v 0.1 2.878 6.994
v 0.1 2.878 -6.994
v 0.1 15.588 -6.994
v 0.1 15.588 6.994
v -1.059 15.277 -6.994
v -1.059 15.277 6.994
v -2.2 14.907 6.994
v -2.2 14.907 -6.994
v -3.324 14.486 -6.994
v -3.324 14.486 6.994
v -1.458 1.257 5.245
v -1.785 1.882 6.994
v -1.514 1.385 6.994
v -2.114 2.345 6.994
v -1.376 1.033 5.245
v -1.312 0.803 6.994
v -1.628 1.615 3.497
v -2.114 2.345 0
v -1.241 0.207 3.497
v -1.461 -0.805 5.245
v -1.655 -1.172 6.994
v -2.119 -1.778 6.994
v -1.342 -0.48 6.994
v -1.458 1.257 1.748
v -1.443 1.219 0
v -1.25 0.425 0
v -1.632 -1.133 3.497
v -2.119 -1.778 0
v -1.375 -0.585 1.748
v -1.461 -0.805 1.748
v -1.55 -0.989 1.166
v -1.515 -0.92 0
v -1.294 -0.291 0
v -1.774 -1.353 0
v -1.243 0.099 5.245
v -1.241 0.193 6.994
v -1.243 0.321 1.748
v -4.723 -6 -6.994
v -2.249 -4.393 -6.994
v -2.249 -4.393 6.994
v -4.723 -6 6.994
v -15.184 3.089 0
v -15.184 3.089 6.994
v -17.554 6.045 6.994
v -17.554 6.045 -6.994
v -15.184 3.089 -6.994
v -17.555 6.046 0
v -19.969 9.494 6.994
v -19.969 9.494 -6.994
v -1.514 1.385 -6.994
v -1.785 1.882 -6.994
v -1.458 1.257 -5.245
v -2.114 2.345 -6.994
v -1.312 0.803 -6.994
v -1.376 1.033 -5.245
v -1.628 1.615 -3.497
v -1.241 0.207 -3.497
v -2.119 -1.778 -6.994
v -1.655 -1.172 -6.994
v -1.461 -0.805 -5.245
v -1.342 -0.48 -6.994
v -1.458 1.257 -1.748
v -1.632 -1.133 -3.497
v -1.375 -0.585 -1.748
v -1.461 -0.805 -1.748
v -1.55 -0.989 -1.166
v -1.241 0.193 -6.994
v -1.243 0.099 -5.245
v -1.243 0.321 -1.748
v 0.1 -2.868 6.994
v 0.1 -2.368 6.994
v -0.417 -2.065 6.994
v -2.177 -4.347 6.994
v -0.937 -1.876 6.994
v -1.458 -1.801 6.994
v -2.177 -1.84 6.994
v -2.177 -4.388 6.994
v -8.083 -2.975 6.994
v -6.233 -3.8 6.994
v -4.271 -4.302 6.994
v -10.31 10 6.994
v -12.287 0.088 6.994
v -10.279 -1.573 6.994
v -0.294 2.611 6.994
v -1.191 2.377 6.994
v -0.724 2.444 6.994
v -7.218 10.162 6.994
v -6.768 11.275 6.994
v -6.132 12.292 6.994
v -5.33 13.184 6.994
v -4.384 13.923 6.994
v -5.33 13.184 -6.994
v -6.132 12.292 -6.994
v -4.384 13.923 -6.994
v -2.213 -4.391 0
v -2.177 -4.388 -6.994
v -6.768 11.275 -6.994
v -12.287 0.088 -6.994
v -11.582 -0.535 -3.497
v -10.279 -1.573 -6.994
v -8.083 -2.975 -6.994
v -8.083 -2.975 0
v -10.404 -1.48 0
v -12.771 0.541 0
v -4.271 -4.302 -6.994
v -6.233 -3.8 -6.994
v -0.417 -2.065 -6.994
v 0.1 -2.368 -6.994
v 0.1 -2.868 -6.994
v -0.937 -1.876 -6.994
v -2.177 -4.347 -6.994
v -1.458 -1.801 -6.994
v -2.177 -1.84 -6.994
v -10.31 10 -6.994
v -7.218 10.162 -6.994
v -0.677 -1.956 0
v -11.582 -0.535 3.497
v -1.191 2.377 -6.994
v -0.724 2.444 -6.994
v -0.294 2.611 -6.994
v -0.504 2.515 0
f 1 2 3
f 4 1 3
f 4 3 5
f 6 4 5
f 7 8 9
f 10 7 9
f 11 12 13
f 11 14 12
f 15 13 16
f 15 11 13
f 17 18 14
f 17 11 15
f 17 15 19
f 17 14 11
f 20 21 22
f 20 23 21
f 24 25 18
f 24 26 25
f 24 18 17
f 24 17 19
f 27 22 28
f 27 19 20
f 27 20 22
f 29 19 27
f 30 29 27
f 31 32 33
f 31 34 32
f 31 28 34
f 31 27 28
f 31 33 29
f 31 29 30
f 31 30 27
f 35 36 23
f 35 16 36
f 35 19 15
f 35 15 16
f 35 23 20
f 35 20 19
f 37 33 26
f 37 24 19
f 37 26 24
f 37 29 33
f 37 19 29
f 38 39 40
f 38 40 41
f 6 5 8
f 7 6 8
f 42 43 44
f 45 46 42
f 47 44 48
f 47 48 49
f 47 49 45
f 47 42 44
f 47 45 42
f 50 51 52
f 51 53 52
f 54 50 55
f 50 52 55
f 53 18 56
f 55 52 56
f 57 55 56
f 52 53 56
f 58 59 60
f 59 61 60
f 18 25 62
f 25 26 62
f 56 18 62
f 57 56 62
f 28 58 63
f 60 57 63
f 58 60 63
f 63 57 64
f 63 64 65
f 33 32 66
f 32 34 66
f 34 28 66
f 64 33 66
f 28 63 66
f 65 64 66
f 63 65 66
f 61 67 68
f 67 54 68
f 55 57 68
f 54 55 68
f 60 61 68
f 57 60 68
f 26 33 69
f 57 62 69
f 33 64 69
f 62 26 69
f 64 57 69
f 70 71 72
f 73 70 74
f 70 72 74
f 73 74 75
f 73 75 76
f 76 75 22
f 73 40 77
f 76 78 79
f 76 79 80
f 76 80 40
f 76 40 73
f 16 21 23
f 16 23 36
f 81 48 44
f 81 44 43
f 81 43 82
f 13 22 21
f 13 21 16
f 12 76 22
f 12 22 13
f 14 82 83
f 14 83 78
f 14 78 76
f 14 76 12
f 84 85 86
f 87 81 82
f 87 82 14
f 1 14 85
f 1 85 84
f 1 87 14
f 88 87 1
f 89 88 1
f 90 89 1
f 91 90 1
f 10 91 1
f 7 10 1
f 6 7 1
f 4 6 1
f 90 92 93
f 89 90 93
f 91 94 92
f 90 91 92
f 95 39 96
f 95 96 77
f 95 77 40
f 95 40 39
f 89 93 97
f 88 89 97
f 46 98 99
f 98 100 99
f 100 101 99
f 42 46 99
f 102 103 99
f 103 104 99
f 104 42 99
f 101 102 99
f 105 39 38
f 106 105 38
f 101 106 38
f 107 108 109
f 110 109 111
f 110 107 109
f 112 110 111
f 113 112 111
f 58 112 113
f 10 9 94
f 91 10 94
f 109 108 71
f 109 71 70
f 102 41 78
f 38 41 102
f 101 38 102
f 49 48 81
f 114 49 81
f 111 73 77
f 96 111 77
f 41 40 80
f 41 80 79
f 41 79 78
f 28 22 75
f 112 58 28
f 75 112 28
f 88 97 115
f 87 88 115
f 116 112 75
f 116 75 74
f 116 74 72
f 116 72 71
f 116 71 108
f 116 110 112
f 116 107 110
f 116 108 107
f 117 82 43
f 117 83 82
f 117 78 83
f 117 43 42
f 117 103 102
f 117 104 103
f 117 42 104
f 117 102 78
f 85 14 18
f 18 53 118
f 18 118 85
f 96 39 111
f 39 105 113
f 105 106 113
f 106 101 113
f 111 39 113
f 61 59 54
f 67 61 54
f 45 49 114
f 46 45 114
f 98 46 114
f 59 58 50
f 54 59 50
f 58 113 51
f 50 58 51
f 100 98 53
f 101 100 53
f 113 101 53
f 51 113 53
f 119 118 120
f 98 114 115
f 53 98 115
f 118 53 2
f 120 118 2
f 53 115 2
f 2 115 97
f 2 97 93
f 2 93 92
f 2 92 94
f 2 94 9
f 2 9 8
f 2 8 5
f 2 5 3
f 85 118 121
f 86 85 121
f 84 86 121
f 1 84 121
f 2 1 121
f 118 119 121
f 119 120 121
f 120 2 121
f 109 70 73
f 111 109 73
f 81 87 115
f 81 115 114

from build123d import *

# Parameters (mm, degrees)
CROQUIS_BASE_DEPTH              = 6.9937
LENTE_PPAL_1_REACH              = 29.176
LENTE_PPAL_1_DIRECTION_2_REACH  = 29.176
LENTE_PPAL_2_DEPTH              = 28.175928622
LENTE_PPAL_2_DEPTH_BACK         = 28.175928622
CROQUIS9_3_OUTSIDE_W            = 30.065
CROQUIS9_3_OUTSIDE_H            = 25.937
LENTE_FRONTAL_REACH             = 25.403
LENTE_FRONTAL_DIRECTION_2_REACH = 25.403
LENTE_TRASERA_REACH             = 28.281
LENTE_TRASERA_DIRECTION_2_REACH = 28.281


with BuildPart() as part:
    # Croquis1 → croquis base (new, symmetric)
    with BuildSketch(Plane.XY):
        with BuildLine():
            Line((-6.994875026, 10.477389992), (-8.981845695, 12.608155172))
            Line((-8.981845695, 12.608155172), (-23.035921146, 11.871612288))
            Line((-23.035921146, 11.871612288), (-23.035921146, 11.54013782))
            ThreePointArc((-23.035921146, 11.54013782), (-20.949684518, 9.582335705), (-18.945192114, 7.540918896))
            add(Edge.make_bspline(
                [(-18.945192114, 7.540918896), (-10.215008384, -3.697644103), (-2.846604825, -5.059081104)],
                knots=[0.497667241, 0.497667241, 0.497667241, 0.49955428, 0.49955428, 0.49955428], degree=2))
            add(Edge.make_bspline(
                [(-2.846604825, -5.059081104), (-2.498165198, -4.87297933), (-2.177330417, -4.684462446)],
                knots=[0.498812075, 0.498812075, 0.498812075, 0.498911556, 0.498911556, 0.498911556], degree=2))
            Line((-2.177330418, -4.684462446), (-2.177330418, 6.186438919))
            add(Edge.make_bspline(
                [(-2.177330418, 6.186438919), (-4.063319702, 8.141636997), (-6.994875026, 10.477389992)],
                knots=[0.50138293, 0.50138293, 0.50138293, 0.502013312, 0.502013312, 0.502013312], degree=2))
        make_face()
    extrude(amount=CROQUIS_BASE_DEPTH, both=True)

    # lente ppal 1: up to this face of the body (flat: up to its plane)
    lente_ppal_1_end = Plane(part.part.faces().sort_by_distance((-10.153546236, 5.159655324, 6.9937))[0])
    # Croquis9 → lente ppal 1 (add, up to the picked face)
    with BuildSketch(Plane.XY, mode=Mode.PRIVATE) as lente_ppal_1_sk1:
        with BuildLine():
            Line((-2.177330418, -4.388282022), (-2.177330418, -1.840420572))
            add(Edge.make_bspline(
                [(-2.177330418, 2.424232079), (-0.304369248, 0.128042884), (-2.177330418, -1.840420572)],
                knots=[0, 0, 0, 1, 1, 1], degree=2))
            Line((-2.177330418, 2.424232079), (-2.177330418, 6.082860828))
            Line((-2.177330418, 6.082860828), (-10.309820395, 10))
            Line((-10.309820395, 10), (-19.969359014, 9.493765032))
            add(Edge.make_bspline(
                [(-2.177330418, -4.388282022), (-10.4130765, -4.994158739), (-19.969359014, 9.493765032)],
                knots=[0, 0, 0, 1, 1, 1], degree=2))
        make_face()
    lente_ppal_1_tool1 = split(extrude(lente_ppal_1_sk1.sketch, amount=LENTE_PPAL_1_REACH, mode=Mode.PRIVATE), bisect_by=lente_ppal_1_end, keep=Keep.BOTH, mode=Mode.PRIVATE)
    add(lente_ppal_1_tool1.solids().sort_by(Axis((-9.106368, 3.599172, 0), (0, 0, 1)))[0])

    # lente ppal 1 direction 2: up to this face of the body (flat: up to its plane)
    lente_ppal_1_direction_2_end = Plane(part.part.faces().sort_by_distance((-10.153546236, 5.159655324, -6.9937))[0])
    # Croquis9 → lente ppal 1 direction 2 (add, up to the picked face)
    with BuildSketch(Plane.XY, mode=Mode.PRIVATE) as lente_ppal_1_direction_2_sk1:
        with BuildLine():
            Line((-2.177330418, -4.388282022), (-2.177330418, -1.840420572))
            add(Edge.make_bspline(
                [(-2.177330418, 2.424232079), (-0.304369248, 0.128042884), (-2.177330418, -1.840420572)],
                knots=[0, 0, 0, 1, 1, 1], degree=2))
            Line((-2.177330418, 2.424232079), (-2.177330418, 6.082860828))
            Line((-2.177330418, 6.082860828), (-10.309820395, 10))
            Line((-10.309820395, 10), (-19.969359014, 9.493765032))
            add(Edge.make_bspline(
                [(-2.177330418, -4.388282022), (-10.4130765, -4.994158739), (-19.969359014, 9.493765032)],
                knots=[0, 0, 0, 1, 1, 1], degree=2))
        make_face()
    lente_ppal_1_direction_2_tool1 = split(extrude(lente_ppal_1_direction_2_sk1.sketch, amount=-LENTE_PPAL_1_DIRECTION_2_REACH, mode=Mode.PRIVATE), bisect_by=lente_ppal_1_direction_2_end, keep=Keep.BOTH, mode=Mode.PRIVATE)
    add(lente_ppal_1_direction_2_tool1.solids().sort_by(Axis((-9.106368, 3.599172, 0), (0, 0, -1)))[0])

    # Croquis9<3> outside → lente ppal 2 (cut, two sides: drawn at the far end of the back side and taken through both)
    with BuildSketch(Plane.XY.offset(-LENTE_PPAL_2_DEPTH_BACK)):
        with Locations((-12.1385, 3.7745)):
            Rectangle(CROQUIS9_3_OUTSIDE_W, CROQUIS9_3_OUTSIDE_H)
        with BuildLine():
            Line((-2.177330418, -1.840420572), (-2.177330418, -4.388282022))
            add(Edge.make_bspline(
                [(-2.177330418, -4.388282022), (-10.4130765, -4.994158739), (-19.969359014, 9.493765032)],
                knots=[0, 0, 0, 1, 1, 1], degree=2))
            Line((-19.969359014, 9.493765032), (-10.309820395, 10))
            Line((-10.309820395, 10), (-2.177330418, 6.082860828))
            Line((-2.177330418, 6.082860828), (-2.177330418, 2.424232079))
            add(Edge.make_bspline(
                [(-2.177330418, 2.424232079), (-0.304369248, 0.128042884), (-2.177330418, -1.840420572)],
                knots=[0, 0, 0, 1, 1, 1], degree=2))
        make_face(mode=Mode.SUBTRACT)
    extrude(amount=LENTE_PPAL_2_DEPTH + LENTE_PPAL_2_DEPTH_BACK, mode=Mode.SUBTRACT)

    # lente frontal: up to this face of the body (flat: up to its plane)
    lente_frontal_end = Plane(part.part.faces().sort_by_distance((-9.106367081, 3.599171888, 6.9937))[0])
    # Croquis8 → lente frontal (add, up to the picked face)
    with BuildSketch(Plane.XY, mode=Mode.PRIVATE) as lente_frontal_sk1:
        with BuildLine():
            Line((0.1, 2.877673418), (0.1, 15.587903347))
            Line((0.1, 15.587903347), (-1.059110992, 15.277320493))
            Line((-1.059110992, 15.277320493), (-2.200378811, 14.9065001))
            Line((-2.200378811, 14.9065001), (-3.324385438, 14.486251242))
            Line((-3.324385438, 14.486251242), (-4.38392255, 13.922885367))
            Line((-4.38392255, 13.922885367), (-5.329535454, 13.184091597))
            Line((-5.329535454, 13.184091597), (-6.132492182, 12.292317806))
            Line((-6.132492182, 12.292317806), (-6.768395299, 11.274660091))
            Line((-6.768395299, 11.274660091), (-7.217923211, 10.162039465))
            Line((-7.217923211, 10.162039465), (-10.309820395, 10))
            Line((-10.309820395, 10), (-2.177330418, 2.342487007))
            Line((-2.177330418, 2.342487007), (-1.190501641, 2.376947827))
            add(Edge.make_bspline(
                [(-1.190501641, 2.376947827), (-0.463368169, 2.402339888), (0.1, 2.877673418)],
                knots=[0, 0, 0, 1, 1, 1], degree=2))
        make_face()
    lente_frontal_tool1 = split(extrude(lente_frontal_sk1.sketch, amount=LENTE_FRONTAL_REACH, mode=Mode.PRIVATE), bisect_by=lente_frontal_end, keep=Keep.BOTH, mode=Mode.PRIVATE)
    add(lente_frontal_tool1.solids().sort_by(Axis((-3.290182, 8.96302, 0), (0, 0, 1)))[0])

    # lente frontal direction 2: up to this face of the body (flat: up to its plane)
    lente_frontal_direction_2_end = Plane(part.part.faces().sort_by_distance((-9.106367081, 3.599171888, -6.9937))[0])
    # Croquis8 → lente frontal direction 2 (add, up to the picked face)
    with BuildSketch(Plane.XY, mode=Mode.PRIVATE) as lente_frontal_direction_2_sk1:
        with BuildLine():
            Line((0.1, 2.877673418), (0.1, 15.587903347))
            Line((0.1, 15.587903347), (-1.059110992, 15.277320493))
            Line((-1.059110992, 15.277320493), (-2.200378811, 14.9065001))
            Line((-2.200378811, 14.9065001), (-3.324385438, 14.486251242))
            Line((-3.324385438, 14.486251242), (-4.38392255, 13.922885367))
            Line((-4.38392255, 13.922885367), (-5.329535454, 13.184091597))
            Line((-5.329535454, 13.184091597), (-6.132492182, 12.292317806))
            Line((-6.132492182, 12.292317806), (-6.768395299, 11.274660091))
            Line((-6.768395299, 11.274660091), (-7.217923211, 10.162039465))
            Line((-7.217923211, 10.162039465), (-10.309820395, 10))
            Line((-10.309820395, 10), (-2.177330418, 2.342487007))
            Line((-2.177330418, 2.342487007), (-1.190501641, 2.376947827))
            add(Edge.make_bspline(
                [(-1.190501641, 2.376947827), (-0.463368169, 2.402339888), (0.1, 2.877673418)],
                knots=[0, 0, 0, 1, 1, 1], degree=2))
        make_face()
    lente_frontal_direction_2_tool1 = split(extrude(lente_frontal_direction_2_sk1.sketch, amount=-LENTE_FRONTAL_DIRECTION_2_REACH, mode=Mode.PRIVATE), bisect_by=lente_frontal_direction_2_end, keep=Keep.BOTH, mode=Mode.PRIVATE)
    add(lente_frontal_direction_2_tool1.solids().sort_by(Axis((-3.290182, 8.96302, 0), (0, 0, -1)))[0])

    # lente trasera: up to this face of the body (flat: up to its plane)
    lente_trasera_end = Plane(part.part.faces().sort_by_distance((-7.357064552, 5.305385386, 6.9937))[0])
    # Croquis11 → lente trasera (add, up to the picked face)
    with BuildSketch(Plane.XY, mode=Mode.PRIVATE) as lente_trasera_sk1:
        with BuildLine():
            Line((0.1, -2.367807069), (0.1, -2.867807069))
            Line((0.1, -2.867807069), (-4.723154154, -6))
            Line((-4.723154154, -6), (-9.706405629, -1.513060218))
            Line((-9.706405629, -1.513060218), (-1.458120605, -1.801096678))
            add(Edge.make_bspline(
                [(-1.458120605, -1.801096678), (-0.674591915, -1.828458103), (0.1, -2.367807069)],
                knots=[0, 0, 0, 1, 1, 1], degree=2))
        make_face()
    lente_trasera_tool1 = split(extrude(lente_trasera_sk1.sketch, amount=LENTE_TRASERA_REACH, mode=Mode.PRIVATE), bisect_by=lente_trasera_end, keep=Keep.BOTH, mode=Mode.PRIVATE)
    add(lente_trasera_tool1.solids().sort_by(Axis((-4.485422, -3.182948, 0), (0, 0, 1)))[0])

    # lente trasera direction 2: up to this face of the body (flat: up to its plane)
    lente_trasera_direction_2_end = Plane(part.part.faces().sort_by_distance((-7.357064552, 5.305385386, -6.9937))[0])
    # Croquis11 → lente trasera direction 2 (add, up to the picked face)
    with BuildSketch(Plane.XY, mode=Mode.PRIVATE) as lente_trasera_direction_2_sk1:
        with BuildLine():
            Line((0.1, -2.367807069), (0.1, -2.867807069))
            Line((0.1, -2.867807069), (-4.723154154, -6))
            Line((-4.723154154, -6), (-9.706405629, -1.513060218))
            Line((-9.706405629, -1.513060218), (-1.458120605, -1.801096678))
            add(Edge.make_bspline(
                [(-1.458120605, -1.801096678), (-0.674591915, -1.828458103), (0.1, -2.367807069)],
                knots=[0, 0, 0, 1, 1, 1], degree=2))
        make_face()
    lente_trasera_direction_2_tool1 = split(extrude(lente_trasera_direction_2_sk1.sketch, amount=-LENTE_TRASERA_DIRECTION_2_REACH, mode=Mode.PRIVATE), bisect_by=lente_trasera_direction_2_end, keep=Keep.BOTH, mode=Mode.PRIVATE)
    add(lente_trasera_direction_2_tool1.solids().sort_by(Axis((-4.485422, -3.182948, 0), (0, 0, -1)))[0])


solid = part.part
